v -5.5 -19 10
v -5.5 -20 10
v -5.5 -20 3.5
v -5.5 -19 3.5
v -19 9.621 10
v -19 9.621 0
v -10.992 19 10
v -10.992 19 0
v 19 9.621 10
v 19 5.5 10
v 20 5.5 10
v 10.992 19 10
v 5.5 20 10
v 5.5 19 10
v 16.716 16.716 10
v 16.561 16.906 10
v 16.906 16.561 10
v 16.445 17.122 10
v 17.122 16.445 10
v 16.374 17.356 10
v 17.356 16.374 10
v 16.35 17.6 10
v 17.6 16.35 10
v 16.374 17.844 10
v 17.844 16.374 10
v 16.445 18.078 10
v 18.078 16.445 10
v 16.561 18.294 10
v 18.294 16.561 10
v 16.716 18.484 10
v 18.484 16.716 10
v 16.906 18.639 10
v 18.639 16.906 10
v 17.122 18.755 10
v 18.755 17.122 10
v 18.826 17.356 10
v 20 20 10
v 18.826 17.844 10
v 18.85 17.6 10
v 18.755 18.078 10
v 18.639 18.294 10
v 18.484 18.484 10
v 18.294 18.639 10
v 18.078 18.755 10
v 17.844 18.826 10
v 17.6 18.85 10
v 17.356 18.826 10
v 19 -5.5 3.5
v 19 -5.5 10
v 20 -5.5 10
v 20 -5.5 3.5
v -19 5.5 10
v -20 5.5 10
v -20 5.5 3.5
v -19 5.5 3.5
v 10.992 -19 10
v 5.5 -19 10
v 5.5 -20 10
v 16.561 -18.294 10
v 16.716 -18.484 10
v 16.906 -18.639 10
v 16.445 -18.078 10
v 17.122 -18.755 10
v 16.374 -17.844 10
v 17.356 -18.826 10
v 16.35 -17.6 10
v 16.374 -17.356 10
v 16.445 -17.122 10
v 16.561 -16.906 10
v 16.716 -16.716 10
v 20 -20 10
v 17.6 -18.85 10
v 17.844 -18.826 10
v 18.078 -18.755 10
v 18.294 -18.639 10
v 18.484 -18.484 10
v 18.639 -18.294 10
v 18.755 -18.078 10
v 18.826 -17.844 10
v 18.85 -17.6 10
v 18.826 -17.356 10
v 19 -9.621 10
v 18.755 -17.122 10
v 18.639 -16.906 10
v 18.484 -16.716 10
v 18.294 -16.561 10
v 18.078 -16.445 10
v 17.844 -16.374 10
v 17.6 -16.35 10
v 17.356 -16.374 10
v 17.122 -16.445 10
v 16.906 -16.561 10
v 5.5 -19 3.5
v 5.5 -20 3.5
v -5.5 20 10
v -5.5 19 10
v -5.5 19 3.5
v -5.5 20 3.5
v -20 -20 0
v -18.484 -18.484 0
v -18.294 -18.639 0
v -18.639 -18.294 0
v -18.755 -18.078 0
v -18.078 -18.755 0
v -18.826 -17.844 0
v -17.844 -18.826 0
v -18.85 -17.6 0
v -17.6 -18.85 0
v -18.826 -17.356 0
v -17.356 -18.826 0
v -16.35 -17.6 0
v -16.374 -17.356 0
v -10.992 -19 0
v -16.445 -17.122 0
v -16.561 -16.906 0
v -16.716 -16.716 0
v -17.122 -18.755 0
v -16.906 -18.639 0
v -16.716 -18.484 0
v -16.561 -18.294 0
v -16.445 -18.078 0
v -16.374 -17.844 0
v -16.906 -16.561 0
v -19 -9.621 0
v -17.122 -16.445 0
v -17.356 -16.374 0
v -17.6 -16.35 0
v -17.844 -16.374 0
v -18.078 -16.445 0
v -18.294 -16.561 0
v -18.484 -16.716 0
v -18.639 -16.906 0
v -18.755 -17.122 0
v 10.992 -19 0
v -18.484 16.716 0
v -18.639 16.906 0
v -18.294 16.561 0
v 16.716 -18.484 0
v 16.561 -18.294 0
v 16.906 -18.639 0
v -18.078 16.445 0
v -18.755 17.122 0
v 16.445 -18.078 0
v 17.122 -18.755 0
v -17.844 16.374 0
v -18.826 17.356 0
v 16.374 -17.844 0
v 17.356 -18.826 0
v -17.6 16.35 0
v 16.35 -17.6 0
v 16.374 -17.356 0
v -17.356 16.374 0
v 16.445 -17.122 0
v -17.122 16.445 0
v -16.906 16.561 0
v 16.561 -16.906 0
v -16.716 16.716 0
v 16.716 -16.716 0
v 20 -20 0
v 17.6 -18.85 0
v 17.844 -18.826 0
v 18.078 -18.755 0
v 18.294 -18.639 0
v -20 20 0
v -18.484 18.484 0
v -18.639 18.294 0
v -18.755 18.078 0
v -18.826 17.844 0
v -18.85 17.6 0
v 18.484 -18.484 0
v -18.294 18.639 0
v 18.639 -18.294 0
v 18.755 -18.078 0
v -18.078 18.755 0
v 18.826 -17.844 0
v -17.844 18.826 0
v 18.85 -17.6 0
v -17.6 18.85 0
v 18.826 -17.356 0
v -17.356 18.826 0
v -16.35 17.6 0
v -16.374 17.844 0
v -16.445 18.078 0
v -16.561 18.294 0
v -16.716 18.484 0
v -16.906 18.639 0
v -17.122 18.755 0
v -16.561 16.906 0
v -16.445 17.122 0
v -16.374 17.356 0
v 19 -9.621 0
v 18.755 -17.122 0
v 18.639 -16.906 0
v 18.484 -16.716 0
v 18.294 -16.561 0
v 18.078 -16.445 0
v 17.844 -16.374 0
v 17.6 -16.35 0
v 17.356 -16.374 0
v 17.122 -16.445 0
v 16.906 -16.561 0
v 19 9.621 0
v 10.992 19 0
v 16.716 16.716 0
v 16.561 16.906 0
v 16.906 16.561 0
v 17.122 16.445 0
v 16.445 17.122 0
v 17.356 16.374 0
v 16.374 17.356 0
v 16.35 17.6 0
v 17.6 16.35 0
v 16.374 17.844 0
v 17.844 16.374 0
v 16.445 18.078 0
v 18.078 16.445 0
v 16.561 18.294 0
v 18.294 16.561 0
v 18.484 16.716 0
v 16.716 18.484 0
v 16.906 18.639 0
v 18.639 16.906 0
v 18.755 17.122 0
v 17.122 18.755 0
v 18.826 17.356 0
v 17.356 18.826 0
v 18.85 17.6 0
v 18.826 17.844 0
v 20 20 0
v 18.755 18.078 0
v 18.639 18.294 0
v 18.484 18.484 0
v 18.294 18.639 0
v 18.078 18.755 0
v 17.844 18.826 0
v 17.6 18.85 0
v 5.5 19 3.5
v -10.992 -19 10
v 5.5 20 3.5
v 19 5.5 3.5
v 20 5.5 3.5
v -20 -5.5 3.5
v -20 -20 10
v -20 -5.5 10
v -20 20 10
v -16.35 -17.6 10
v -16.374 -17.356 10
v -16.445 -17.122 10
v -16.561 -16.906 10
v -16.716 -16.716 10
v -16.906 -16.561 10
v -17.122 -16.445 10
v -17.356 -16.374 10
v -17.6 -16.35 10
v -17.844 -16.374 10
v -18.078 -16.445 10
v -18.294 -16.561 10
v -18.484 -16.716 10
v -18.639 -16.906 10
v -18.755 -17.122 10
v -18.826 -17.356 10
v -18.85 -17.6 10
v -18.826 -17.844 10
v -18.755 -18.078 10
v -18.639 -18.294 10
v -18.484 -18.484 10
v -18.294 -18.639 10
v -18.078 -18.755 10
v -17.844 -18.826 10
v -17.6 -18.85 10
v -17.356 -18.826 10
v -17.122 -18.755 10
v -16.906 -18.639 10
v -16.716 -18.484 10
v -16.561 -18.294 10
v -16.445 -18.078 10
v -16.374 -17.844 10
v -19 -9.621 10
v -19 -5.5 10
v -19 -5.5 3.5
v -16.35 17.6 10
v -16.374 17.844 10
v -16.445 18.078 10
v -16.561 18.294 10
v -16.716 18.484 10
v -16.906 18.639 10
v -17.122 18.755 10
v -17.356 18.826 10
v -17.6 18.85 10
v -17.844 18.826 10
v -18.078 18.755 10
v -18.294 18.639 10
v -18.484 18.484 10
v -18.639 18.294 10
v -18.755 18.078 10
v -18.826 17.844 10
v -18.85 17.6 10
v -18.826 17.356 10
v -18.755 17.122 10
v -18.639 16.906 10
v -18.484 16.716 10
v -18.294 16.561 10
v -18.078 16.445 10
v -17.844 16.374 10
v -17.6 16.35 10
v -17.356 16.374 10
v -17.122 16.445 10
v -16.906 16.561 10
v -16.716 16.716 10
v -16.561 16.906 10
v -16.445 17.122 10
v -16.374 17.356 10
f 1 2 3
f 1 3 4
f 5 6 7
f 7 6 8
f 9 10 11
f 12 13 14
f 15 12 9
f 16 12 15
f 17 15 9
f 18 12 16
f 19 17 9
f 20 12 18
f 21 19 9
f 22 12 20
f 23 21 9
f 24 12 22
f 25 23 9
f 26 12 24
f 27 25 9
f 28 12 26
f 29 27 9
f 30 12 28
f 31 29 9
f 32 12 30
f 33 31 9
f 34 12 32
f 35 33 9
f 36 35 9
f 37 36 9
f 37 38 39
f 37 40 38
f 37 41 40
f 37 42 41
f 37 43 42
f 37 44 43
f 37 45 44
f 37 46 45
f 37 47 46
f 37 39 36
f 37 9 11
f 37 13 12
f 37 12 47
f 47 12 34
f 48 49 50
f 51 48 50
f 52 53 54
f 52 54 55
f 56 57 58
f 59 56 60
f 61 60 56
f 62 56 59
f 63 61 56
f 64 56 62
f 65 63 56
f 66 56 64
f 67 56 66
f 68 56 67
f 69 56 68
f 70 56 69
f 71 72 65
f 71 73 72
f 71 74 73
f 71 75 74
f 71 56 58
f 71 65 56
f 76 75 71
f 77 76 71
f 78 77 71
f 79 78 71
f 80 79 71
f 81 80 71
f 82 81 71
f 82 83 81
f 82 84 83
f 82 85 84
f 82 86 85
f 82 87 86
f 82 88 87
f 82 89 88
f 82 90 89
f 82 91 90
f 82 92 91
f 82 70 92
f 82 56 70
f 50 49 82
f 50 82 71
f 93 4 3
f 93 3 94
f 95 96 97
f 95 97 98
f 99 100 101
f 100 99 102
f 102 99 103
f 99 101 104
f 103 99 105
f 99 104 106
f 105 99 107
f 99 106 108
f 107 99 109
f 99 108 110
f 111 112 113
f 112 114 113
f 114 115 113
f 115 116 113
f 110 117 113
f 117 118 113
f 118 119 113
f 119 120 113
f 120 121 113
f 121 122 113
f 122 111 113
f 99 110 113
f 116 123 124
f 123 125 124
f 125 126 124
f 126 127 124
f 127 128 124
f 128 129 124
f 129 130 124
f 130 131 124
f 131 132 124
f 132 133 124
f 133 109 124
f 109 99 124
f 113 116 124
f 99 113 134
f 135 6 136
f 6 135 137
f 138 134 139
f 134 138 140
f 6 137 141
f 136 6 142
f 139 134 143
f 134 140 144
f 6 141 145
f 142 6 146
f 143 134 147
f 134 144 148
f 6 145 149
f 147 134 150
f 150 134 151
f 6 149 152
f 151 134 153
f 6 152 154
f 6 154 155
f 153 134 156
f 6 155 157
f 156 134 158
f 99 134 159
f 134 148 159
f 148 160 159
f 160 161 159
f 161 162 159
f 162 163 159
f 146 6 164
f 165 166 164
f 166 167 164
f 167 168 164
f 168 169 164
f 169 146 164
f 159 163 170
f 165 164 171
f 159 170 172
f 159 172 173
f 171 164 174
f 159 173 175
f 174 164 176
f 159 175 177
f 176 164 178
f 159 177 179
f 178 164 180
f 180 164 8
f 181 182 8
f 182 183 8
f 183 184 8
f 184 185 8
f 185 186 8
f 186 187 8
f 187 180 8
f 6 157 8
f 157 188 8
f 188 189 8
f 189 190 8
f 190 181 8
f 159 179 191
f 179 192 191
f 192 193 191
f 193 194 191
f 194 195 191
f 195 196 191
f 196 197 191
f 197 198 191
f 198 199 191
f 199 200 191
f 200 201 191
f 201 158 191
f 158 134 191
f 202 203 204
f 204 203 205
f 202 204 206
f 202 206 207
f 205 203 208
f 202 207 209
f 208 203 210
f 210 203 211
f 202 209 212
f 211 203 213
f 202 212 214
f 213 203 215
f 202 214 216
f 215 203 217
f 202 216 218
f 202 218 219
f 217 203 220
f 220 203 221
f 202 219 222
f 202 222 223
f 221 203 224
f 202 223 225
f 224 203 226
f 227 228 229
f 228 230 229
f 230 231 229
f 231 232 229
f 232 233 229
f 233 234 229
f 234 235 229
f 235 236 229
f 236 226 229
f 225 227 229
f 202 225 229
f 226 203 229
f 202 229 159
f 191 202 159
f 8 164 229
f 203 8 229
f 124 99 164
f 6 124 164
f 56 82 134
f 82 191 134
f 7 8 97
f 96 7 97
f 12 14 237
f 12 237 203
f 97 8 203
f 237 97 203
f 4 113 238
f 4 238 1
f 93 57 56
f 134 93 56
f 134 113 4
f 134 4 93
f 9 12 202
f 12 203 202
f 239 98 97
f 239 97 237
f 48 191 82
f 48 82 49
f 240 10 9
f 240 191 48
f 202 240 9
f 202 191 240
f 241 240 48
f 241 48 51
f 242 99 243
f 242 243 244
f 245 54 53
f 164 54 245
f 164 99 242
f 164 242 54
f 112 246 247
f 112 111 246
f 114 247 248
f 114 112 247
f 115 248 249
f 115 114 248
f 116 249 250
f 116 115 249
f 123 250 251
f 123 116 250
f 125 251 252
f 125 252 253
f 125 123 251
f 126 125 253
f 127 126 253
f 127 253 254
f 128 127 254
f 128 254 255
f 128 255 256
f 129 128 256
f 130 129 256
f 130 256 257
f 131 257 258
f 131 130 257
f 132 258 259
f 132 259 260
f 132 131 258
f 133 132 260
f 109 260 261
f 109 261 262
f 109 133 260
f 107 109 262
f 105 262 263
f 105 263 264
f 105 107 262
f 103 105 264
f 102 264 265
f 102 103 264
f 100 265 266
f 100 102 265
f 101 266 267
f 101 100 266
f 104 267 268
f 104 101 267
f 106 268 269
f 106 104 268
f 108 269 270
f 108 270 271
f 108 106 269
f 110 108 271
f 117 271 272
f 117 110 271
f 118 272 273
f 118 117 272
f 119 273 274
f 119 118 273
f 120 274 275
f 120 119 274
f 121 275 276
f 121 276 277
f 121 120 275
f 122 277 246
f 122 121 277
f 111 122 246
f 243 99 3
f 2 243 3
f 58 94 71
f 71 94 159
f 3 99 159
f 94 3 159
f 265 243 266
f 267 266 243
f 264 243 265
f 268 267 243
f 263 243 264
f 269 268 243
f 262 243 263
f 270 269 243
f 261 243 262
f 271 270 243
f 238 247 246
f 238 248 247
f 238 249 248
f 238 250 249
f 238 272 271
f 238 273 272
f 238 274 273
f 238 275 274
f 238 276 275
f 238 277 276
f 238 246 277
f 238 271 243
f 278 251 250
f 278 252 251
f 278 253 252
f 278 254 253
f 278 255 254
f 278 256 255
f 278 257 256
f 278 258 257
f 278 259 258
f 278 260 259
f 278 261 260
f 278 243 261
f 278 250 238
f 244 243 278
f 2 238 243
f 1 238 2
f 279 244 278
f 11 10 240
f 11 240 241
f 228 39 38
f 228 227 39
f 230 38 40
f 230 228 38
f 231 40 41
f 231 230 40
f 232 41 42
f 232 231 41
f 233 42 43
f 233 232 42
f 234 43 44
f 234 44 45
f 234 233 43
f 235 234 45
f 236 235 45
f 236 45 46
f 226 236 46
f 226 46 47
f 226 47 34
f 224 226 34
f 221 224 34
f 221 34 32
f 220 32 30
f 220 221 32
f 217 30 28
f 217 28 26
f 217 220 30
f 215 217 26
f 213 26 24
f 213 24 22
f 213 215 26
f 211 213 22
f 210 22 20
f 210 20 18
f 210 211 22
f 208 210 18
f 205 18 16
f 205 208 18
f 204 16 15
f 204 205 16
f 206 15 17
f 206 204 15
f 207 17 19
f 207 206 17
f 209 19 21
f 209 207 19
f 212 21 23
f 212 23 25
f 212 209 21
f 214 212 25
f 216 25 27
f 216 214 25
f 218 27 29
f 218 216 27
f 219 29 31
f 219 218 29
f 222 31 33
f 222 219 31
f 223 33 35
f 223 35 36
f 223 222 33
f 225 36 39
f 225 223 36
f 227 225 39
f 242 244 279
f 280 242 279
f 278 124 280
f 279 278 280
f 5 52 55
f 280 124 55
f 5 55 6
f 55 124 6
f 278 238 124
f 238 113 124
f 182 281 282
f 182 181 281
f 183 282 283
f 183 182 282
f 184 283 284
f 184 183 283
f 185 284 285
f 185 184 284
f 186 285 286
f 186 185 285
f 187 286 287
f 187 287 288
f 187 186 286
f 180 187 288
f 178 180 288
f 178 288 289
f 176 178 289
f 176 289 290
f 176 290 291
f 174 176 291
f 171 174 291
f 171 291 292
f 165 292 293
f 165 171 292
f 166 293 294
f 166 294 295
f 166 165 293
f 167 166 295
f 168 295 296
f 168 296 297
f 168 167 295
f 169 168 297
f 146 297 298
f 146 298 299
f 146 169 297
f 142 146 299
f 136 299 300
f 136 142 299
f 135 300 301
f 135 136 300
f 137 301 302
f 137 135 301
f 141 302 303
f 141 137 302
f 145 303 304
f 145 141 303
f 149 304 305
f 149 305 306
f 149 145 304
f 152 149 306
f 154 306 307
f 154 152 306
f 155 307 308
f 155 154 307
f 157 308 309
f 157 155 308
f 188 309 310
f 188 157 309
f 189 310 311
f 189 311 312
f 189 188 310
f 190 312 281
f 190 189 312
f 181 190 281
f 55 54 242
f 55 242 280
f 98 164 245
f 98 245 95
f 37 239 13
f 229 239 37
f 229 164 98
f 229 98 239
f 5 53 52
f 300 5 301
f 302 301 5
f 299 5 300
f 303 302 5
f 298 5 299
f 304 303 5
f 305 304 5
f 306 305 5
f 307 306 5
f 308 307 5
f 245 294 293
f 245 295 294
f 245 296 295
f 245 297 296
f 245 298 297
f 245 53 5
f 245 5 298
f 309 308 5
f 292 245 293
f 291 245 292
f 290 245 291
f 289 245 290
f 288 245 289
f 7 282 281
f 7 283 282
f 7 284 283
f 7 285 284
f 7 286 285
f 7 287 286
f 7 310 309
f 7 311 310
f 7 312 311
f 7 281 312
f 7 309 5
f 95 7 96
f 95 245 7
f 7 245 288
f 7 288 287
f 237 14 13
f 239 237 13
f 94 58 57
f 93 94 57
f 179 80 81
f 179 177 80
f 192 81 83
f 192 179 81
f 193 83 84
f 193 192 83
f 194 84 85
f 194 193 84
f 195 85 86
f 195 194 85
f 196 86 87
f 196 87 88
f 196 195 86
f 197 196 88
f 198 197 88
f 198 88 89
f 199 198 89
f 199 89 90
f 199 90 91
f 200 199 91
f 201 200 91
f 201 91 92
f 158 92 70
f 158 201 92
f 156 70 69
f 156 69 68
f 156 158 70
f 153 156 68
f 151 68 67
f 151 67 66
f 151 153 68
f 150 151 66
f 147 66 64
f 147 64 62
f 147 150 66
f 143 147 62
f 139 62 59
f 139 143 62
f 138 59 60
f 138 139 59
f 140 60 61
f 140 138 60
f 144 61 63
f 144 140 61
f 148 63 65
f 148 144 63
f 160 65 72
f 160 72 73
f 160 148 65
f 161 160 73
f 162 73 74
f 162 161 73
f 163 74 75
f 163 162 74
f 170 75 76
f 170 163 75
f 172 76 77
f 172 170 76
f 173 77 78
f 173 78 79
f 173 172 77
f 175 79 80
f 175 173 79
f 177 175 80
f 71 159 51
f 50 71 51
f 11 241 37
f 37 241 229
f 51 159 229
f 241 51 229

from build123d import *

# Parameters (mm, degrees)
F0_W     = 40
F0_H     = 40
F1_DEPTH = 10
F2_T     = -1
F3_R     = 1.25
F4_DEPTH = 10
F5_DEPTH = 25
F6_DEPTH = 25
F7_W     = 11
F7_H     = 1
F7_W_2   = 1
F7_H_2   = 11
F8_DEPTH = 6.5


with BuildPart() as f1:
    # F0 (on Top) → F1 (new body)
    with BuildSketch(Plane.XY):
        Rectangle(F0_W, F0_H)
    extrude(amount=F1_DEPTH)

    # F2
    f2_openings = [f1.faces().sort_by_distance(p)[0] for p in [
        (0, 0, 10),
    ]]
    offset(amount=F2_T, openings=f2_openings)

    # F3 (on face) → F4 (join)
    with BuildSketch(Plane.XY):
        Polygon((-20, -8.4495466982), (-20, -20), (-10.1382084124, -20), align=None)
        with Locations((-17.6, -17.6)):
            Circle(F3_R, mode=Mode.SUBTRACT)
        Polygon((20, -8.4495466982), (10.1382084124, -20), (20, -20), align=None)
        with Locations((17.6, -17.6)):
            Circle(F3_R, mode=Mode.SUBTRACT)
        Polygon((-20, 20), (-20, 8.4495466982), (-10.1382084124, 20), align=None)
        with Locations((-17.6, 17.6)):
            Circle(F3_R, mode=Mode.SUBTRACT)
        Polygon((20, 20), (10.1382084124, 20), (20, 8.4495466982), align=None)
        with Locations((17.6, 17.6)):
            Circle(F3_R, mode=Mode.SUBTRACT)
    extrude(amount=F4_DEPTH)

    # F3 (on face) → F5 (cut)
    with BuildSketch(Plane.XY):
        with Locations((-17.6, -17.6)):
            Circle(F3_R)
        with Locations((17.6, -17.6)):
            Circle(F3_R)
        with Locations((17.6, 17.6)):
            Circle(F3_R)
        with Locations((-17.6, 17.6)):
            Circle(F3_R)
    extrude(amount=F5_DEPTH, mode=Mode.SUBTRACT)

    # F6 (cut): a face of the model
    f6_faces = [f1.faces().sort_by_distance(p)[0] for p in [
        (0, 0, 1),
    ]]
    extrude(f6_faces, amount=-F6_DEPTH, mode=Mode.SUBTRACT)

    # F7 (on face) → F8 (cut)
    with BuildSketch(Plane.XY.offset(10)):
        with Locations((0, 19.5)):
            Rectangle(F7_W, F7_H)
        with Locations((0, -19.5)):
            Rectangle(F7_W, F7_H)
        with Locations((-19.5, 0)):
            Rectangle(F7_W_2, F7_H_2)
        with Locations((19.5, 0)):
            Rectangle(F7_W_2, F7_H_2)
    extrude(amount=-F8_DEPTH, mode=Mode.SUBTRACT)


solid = f1.part
